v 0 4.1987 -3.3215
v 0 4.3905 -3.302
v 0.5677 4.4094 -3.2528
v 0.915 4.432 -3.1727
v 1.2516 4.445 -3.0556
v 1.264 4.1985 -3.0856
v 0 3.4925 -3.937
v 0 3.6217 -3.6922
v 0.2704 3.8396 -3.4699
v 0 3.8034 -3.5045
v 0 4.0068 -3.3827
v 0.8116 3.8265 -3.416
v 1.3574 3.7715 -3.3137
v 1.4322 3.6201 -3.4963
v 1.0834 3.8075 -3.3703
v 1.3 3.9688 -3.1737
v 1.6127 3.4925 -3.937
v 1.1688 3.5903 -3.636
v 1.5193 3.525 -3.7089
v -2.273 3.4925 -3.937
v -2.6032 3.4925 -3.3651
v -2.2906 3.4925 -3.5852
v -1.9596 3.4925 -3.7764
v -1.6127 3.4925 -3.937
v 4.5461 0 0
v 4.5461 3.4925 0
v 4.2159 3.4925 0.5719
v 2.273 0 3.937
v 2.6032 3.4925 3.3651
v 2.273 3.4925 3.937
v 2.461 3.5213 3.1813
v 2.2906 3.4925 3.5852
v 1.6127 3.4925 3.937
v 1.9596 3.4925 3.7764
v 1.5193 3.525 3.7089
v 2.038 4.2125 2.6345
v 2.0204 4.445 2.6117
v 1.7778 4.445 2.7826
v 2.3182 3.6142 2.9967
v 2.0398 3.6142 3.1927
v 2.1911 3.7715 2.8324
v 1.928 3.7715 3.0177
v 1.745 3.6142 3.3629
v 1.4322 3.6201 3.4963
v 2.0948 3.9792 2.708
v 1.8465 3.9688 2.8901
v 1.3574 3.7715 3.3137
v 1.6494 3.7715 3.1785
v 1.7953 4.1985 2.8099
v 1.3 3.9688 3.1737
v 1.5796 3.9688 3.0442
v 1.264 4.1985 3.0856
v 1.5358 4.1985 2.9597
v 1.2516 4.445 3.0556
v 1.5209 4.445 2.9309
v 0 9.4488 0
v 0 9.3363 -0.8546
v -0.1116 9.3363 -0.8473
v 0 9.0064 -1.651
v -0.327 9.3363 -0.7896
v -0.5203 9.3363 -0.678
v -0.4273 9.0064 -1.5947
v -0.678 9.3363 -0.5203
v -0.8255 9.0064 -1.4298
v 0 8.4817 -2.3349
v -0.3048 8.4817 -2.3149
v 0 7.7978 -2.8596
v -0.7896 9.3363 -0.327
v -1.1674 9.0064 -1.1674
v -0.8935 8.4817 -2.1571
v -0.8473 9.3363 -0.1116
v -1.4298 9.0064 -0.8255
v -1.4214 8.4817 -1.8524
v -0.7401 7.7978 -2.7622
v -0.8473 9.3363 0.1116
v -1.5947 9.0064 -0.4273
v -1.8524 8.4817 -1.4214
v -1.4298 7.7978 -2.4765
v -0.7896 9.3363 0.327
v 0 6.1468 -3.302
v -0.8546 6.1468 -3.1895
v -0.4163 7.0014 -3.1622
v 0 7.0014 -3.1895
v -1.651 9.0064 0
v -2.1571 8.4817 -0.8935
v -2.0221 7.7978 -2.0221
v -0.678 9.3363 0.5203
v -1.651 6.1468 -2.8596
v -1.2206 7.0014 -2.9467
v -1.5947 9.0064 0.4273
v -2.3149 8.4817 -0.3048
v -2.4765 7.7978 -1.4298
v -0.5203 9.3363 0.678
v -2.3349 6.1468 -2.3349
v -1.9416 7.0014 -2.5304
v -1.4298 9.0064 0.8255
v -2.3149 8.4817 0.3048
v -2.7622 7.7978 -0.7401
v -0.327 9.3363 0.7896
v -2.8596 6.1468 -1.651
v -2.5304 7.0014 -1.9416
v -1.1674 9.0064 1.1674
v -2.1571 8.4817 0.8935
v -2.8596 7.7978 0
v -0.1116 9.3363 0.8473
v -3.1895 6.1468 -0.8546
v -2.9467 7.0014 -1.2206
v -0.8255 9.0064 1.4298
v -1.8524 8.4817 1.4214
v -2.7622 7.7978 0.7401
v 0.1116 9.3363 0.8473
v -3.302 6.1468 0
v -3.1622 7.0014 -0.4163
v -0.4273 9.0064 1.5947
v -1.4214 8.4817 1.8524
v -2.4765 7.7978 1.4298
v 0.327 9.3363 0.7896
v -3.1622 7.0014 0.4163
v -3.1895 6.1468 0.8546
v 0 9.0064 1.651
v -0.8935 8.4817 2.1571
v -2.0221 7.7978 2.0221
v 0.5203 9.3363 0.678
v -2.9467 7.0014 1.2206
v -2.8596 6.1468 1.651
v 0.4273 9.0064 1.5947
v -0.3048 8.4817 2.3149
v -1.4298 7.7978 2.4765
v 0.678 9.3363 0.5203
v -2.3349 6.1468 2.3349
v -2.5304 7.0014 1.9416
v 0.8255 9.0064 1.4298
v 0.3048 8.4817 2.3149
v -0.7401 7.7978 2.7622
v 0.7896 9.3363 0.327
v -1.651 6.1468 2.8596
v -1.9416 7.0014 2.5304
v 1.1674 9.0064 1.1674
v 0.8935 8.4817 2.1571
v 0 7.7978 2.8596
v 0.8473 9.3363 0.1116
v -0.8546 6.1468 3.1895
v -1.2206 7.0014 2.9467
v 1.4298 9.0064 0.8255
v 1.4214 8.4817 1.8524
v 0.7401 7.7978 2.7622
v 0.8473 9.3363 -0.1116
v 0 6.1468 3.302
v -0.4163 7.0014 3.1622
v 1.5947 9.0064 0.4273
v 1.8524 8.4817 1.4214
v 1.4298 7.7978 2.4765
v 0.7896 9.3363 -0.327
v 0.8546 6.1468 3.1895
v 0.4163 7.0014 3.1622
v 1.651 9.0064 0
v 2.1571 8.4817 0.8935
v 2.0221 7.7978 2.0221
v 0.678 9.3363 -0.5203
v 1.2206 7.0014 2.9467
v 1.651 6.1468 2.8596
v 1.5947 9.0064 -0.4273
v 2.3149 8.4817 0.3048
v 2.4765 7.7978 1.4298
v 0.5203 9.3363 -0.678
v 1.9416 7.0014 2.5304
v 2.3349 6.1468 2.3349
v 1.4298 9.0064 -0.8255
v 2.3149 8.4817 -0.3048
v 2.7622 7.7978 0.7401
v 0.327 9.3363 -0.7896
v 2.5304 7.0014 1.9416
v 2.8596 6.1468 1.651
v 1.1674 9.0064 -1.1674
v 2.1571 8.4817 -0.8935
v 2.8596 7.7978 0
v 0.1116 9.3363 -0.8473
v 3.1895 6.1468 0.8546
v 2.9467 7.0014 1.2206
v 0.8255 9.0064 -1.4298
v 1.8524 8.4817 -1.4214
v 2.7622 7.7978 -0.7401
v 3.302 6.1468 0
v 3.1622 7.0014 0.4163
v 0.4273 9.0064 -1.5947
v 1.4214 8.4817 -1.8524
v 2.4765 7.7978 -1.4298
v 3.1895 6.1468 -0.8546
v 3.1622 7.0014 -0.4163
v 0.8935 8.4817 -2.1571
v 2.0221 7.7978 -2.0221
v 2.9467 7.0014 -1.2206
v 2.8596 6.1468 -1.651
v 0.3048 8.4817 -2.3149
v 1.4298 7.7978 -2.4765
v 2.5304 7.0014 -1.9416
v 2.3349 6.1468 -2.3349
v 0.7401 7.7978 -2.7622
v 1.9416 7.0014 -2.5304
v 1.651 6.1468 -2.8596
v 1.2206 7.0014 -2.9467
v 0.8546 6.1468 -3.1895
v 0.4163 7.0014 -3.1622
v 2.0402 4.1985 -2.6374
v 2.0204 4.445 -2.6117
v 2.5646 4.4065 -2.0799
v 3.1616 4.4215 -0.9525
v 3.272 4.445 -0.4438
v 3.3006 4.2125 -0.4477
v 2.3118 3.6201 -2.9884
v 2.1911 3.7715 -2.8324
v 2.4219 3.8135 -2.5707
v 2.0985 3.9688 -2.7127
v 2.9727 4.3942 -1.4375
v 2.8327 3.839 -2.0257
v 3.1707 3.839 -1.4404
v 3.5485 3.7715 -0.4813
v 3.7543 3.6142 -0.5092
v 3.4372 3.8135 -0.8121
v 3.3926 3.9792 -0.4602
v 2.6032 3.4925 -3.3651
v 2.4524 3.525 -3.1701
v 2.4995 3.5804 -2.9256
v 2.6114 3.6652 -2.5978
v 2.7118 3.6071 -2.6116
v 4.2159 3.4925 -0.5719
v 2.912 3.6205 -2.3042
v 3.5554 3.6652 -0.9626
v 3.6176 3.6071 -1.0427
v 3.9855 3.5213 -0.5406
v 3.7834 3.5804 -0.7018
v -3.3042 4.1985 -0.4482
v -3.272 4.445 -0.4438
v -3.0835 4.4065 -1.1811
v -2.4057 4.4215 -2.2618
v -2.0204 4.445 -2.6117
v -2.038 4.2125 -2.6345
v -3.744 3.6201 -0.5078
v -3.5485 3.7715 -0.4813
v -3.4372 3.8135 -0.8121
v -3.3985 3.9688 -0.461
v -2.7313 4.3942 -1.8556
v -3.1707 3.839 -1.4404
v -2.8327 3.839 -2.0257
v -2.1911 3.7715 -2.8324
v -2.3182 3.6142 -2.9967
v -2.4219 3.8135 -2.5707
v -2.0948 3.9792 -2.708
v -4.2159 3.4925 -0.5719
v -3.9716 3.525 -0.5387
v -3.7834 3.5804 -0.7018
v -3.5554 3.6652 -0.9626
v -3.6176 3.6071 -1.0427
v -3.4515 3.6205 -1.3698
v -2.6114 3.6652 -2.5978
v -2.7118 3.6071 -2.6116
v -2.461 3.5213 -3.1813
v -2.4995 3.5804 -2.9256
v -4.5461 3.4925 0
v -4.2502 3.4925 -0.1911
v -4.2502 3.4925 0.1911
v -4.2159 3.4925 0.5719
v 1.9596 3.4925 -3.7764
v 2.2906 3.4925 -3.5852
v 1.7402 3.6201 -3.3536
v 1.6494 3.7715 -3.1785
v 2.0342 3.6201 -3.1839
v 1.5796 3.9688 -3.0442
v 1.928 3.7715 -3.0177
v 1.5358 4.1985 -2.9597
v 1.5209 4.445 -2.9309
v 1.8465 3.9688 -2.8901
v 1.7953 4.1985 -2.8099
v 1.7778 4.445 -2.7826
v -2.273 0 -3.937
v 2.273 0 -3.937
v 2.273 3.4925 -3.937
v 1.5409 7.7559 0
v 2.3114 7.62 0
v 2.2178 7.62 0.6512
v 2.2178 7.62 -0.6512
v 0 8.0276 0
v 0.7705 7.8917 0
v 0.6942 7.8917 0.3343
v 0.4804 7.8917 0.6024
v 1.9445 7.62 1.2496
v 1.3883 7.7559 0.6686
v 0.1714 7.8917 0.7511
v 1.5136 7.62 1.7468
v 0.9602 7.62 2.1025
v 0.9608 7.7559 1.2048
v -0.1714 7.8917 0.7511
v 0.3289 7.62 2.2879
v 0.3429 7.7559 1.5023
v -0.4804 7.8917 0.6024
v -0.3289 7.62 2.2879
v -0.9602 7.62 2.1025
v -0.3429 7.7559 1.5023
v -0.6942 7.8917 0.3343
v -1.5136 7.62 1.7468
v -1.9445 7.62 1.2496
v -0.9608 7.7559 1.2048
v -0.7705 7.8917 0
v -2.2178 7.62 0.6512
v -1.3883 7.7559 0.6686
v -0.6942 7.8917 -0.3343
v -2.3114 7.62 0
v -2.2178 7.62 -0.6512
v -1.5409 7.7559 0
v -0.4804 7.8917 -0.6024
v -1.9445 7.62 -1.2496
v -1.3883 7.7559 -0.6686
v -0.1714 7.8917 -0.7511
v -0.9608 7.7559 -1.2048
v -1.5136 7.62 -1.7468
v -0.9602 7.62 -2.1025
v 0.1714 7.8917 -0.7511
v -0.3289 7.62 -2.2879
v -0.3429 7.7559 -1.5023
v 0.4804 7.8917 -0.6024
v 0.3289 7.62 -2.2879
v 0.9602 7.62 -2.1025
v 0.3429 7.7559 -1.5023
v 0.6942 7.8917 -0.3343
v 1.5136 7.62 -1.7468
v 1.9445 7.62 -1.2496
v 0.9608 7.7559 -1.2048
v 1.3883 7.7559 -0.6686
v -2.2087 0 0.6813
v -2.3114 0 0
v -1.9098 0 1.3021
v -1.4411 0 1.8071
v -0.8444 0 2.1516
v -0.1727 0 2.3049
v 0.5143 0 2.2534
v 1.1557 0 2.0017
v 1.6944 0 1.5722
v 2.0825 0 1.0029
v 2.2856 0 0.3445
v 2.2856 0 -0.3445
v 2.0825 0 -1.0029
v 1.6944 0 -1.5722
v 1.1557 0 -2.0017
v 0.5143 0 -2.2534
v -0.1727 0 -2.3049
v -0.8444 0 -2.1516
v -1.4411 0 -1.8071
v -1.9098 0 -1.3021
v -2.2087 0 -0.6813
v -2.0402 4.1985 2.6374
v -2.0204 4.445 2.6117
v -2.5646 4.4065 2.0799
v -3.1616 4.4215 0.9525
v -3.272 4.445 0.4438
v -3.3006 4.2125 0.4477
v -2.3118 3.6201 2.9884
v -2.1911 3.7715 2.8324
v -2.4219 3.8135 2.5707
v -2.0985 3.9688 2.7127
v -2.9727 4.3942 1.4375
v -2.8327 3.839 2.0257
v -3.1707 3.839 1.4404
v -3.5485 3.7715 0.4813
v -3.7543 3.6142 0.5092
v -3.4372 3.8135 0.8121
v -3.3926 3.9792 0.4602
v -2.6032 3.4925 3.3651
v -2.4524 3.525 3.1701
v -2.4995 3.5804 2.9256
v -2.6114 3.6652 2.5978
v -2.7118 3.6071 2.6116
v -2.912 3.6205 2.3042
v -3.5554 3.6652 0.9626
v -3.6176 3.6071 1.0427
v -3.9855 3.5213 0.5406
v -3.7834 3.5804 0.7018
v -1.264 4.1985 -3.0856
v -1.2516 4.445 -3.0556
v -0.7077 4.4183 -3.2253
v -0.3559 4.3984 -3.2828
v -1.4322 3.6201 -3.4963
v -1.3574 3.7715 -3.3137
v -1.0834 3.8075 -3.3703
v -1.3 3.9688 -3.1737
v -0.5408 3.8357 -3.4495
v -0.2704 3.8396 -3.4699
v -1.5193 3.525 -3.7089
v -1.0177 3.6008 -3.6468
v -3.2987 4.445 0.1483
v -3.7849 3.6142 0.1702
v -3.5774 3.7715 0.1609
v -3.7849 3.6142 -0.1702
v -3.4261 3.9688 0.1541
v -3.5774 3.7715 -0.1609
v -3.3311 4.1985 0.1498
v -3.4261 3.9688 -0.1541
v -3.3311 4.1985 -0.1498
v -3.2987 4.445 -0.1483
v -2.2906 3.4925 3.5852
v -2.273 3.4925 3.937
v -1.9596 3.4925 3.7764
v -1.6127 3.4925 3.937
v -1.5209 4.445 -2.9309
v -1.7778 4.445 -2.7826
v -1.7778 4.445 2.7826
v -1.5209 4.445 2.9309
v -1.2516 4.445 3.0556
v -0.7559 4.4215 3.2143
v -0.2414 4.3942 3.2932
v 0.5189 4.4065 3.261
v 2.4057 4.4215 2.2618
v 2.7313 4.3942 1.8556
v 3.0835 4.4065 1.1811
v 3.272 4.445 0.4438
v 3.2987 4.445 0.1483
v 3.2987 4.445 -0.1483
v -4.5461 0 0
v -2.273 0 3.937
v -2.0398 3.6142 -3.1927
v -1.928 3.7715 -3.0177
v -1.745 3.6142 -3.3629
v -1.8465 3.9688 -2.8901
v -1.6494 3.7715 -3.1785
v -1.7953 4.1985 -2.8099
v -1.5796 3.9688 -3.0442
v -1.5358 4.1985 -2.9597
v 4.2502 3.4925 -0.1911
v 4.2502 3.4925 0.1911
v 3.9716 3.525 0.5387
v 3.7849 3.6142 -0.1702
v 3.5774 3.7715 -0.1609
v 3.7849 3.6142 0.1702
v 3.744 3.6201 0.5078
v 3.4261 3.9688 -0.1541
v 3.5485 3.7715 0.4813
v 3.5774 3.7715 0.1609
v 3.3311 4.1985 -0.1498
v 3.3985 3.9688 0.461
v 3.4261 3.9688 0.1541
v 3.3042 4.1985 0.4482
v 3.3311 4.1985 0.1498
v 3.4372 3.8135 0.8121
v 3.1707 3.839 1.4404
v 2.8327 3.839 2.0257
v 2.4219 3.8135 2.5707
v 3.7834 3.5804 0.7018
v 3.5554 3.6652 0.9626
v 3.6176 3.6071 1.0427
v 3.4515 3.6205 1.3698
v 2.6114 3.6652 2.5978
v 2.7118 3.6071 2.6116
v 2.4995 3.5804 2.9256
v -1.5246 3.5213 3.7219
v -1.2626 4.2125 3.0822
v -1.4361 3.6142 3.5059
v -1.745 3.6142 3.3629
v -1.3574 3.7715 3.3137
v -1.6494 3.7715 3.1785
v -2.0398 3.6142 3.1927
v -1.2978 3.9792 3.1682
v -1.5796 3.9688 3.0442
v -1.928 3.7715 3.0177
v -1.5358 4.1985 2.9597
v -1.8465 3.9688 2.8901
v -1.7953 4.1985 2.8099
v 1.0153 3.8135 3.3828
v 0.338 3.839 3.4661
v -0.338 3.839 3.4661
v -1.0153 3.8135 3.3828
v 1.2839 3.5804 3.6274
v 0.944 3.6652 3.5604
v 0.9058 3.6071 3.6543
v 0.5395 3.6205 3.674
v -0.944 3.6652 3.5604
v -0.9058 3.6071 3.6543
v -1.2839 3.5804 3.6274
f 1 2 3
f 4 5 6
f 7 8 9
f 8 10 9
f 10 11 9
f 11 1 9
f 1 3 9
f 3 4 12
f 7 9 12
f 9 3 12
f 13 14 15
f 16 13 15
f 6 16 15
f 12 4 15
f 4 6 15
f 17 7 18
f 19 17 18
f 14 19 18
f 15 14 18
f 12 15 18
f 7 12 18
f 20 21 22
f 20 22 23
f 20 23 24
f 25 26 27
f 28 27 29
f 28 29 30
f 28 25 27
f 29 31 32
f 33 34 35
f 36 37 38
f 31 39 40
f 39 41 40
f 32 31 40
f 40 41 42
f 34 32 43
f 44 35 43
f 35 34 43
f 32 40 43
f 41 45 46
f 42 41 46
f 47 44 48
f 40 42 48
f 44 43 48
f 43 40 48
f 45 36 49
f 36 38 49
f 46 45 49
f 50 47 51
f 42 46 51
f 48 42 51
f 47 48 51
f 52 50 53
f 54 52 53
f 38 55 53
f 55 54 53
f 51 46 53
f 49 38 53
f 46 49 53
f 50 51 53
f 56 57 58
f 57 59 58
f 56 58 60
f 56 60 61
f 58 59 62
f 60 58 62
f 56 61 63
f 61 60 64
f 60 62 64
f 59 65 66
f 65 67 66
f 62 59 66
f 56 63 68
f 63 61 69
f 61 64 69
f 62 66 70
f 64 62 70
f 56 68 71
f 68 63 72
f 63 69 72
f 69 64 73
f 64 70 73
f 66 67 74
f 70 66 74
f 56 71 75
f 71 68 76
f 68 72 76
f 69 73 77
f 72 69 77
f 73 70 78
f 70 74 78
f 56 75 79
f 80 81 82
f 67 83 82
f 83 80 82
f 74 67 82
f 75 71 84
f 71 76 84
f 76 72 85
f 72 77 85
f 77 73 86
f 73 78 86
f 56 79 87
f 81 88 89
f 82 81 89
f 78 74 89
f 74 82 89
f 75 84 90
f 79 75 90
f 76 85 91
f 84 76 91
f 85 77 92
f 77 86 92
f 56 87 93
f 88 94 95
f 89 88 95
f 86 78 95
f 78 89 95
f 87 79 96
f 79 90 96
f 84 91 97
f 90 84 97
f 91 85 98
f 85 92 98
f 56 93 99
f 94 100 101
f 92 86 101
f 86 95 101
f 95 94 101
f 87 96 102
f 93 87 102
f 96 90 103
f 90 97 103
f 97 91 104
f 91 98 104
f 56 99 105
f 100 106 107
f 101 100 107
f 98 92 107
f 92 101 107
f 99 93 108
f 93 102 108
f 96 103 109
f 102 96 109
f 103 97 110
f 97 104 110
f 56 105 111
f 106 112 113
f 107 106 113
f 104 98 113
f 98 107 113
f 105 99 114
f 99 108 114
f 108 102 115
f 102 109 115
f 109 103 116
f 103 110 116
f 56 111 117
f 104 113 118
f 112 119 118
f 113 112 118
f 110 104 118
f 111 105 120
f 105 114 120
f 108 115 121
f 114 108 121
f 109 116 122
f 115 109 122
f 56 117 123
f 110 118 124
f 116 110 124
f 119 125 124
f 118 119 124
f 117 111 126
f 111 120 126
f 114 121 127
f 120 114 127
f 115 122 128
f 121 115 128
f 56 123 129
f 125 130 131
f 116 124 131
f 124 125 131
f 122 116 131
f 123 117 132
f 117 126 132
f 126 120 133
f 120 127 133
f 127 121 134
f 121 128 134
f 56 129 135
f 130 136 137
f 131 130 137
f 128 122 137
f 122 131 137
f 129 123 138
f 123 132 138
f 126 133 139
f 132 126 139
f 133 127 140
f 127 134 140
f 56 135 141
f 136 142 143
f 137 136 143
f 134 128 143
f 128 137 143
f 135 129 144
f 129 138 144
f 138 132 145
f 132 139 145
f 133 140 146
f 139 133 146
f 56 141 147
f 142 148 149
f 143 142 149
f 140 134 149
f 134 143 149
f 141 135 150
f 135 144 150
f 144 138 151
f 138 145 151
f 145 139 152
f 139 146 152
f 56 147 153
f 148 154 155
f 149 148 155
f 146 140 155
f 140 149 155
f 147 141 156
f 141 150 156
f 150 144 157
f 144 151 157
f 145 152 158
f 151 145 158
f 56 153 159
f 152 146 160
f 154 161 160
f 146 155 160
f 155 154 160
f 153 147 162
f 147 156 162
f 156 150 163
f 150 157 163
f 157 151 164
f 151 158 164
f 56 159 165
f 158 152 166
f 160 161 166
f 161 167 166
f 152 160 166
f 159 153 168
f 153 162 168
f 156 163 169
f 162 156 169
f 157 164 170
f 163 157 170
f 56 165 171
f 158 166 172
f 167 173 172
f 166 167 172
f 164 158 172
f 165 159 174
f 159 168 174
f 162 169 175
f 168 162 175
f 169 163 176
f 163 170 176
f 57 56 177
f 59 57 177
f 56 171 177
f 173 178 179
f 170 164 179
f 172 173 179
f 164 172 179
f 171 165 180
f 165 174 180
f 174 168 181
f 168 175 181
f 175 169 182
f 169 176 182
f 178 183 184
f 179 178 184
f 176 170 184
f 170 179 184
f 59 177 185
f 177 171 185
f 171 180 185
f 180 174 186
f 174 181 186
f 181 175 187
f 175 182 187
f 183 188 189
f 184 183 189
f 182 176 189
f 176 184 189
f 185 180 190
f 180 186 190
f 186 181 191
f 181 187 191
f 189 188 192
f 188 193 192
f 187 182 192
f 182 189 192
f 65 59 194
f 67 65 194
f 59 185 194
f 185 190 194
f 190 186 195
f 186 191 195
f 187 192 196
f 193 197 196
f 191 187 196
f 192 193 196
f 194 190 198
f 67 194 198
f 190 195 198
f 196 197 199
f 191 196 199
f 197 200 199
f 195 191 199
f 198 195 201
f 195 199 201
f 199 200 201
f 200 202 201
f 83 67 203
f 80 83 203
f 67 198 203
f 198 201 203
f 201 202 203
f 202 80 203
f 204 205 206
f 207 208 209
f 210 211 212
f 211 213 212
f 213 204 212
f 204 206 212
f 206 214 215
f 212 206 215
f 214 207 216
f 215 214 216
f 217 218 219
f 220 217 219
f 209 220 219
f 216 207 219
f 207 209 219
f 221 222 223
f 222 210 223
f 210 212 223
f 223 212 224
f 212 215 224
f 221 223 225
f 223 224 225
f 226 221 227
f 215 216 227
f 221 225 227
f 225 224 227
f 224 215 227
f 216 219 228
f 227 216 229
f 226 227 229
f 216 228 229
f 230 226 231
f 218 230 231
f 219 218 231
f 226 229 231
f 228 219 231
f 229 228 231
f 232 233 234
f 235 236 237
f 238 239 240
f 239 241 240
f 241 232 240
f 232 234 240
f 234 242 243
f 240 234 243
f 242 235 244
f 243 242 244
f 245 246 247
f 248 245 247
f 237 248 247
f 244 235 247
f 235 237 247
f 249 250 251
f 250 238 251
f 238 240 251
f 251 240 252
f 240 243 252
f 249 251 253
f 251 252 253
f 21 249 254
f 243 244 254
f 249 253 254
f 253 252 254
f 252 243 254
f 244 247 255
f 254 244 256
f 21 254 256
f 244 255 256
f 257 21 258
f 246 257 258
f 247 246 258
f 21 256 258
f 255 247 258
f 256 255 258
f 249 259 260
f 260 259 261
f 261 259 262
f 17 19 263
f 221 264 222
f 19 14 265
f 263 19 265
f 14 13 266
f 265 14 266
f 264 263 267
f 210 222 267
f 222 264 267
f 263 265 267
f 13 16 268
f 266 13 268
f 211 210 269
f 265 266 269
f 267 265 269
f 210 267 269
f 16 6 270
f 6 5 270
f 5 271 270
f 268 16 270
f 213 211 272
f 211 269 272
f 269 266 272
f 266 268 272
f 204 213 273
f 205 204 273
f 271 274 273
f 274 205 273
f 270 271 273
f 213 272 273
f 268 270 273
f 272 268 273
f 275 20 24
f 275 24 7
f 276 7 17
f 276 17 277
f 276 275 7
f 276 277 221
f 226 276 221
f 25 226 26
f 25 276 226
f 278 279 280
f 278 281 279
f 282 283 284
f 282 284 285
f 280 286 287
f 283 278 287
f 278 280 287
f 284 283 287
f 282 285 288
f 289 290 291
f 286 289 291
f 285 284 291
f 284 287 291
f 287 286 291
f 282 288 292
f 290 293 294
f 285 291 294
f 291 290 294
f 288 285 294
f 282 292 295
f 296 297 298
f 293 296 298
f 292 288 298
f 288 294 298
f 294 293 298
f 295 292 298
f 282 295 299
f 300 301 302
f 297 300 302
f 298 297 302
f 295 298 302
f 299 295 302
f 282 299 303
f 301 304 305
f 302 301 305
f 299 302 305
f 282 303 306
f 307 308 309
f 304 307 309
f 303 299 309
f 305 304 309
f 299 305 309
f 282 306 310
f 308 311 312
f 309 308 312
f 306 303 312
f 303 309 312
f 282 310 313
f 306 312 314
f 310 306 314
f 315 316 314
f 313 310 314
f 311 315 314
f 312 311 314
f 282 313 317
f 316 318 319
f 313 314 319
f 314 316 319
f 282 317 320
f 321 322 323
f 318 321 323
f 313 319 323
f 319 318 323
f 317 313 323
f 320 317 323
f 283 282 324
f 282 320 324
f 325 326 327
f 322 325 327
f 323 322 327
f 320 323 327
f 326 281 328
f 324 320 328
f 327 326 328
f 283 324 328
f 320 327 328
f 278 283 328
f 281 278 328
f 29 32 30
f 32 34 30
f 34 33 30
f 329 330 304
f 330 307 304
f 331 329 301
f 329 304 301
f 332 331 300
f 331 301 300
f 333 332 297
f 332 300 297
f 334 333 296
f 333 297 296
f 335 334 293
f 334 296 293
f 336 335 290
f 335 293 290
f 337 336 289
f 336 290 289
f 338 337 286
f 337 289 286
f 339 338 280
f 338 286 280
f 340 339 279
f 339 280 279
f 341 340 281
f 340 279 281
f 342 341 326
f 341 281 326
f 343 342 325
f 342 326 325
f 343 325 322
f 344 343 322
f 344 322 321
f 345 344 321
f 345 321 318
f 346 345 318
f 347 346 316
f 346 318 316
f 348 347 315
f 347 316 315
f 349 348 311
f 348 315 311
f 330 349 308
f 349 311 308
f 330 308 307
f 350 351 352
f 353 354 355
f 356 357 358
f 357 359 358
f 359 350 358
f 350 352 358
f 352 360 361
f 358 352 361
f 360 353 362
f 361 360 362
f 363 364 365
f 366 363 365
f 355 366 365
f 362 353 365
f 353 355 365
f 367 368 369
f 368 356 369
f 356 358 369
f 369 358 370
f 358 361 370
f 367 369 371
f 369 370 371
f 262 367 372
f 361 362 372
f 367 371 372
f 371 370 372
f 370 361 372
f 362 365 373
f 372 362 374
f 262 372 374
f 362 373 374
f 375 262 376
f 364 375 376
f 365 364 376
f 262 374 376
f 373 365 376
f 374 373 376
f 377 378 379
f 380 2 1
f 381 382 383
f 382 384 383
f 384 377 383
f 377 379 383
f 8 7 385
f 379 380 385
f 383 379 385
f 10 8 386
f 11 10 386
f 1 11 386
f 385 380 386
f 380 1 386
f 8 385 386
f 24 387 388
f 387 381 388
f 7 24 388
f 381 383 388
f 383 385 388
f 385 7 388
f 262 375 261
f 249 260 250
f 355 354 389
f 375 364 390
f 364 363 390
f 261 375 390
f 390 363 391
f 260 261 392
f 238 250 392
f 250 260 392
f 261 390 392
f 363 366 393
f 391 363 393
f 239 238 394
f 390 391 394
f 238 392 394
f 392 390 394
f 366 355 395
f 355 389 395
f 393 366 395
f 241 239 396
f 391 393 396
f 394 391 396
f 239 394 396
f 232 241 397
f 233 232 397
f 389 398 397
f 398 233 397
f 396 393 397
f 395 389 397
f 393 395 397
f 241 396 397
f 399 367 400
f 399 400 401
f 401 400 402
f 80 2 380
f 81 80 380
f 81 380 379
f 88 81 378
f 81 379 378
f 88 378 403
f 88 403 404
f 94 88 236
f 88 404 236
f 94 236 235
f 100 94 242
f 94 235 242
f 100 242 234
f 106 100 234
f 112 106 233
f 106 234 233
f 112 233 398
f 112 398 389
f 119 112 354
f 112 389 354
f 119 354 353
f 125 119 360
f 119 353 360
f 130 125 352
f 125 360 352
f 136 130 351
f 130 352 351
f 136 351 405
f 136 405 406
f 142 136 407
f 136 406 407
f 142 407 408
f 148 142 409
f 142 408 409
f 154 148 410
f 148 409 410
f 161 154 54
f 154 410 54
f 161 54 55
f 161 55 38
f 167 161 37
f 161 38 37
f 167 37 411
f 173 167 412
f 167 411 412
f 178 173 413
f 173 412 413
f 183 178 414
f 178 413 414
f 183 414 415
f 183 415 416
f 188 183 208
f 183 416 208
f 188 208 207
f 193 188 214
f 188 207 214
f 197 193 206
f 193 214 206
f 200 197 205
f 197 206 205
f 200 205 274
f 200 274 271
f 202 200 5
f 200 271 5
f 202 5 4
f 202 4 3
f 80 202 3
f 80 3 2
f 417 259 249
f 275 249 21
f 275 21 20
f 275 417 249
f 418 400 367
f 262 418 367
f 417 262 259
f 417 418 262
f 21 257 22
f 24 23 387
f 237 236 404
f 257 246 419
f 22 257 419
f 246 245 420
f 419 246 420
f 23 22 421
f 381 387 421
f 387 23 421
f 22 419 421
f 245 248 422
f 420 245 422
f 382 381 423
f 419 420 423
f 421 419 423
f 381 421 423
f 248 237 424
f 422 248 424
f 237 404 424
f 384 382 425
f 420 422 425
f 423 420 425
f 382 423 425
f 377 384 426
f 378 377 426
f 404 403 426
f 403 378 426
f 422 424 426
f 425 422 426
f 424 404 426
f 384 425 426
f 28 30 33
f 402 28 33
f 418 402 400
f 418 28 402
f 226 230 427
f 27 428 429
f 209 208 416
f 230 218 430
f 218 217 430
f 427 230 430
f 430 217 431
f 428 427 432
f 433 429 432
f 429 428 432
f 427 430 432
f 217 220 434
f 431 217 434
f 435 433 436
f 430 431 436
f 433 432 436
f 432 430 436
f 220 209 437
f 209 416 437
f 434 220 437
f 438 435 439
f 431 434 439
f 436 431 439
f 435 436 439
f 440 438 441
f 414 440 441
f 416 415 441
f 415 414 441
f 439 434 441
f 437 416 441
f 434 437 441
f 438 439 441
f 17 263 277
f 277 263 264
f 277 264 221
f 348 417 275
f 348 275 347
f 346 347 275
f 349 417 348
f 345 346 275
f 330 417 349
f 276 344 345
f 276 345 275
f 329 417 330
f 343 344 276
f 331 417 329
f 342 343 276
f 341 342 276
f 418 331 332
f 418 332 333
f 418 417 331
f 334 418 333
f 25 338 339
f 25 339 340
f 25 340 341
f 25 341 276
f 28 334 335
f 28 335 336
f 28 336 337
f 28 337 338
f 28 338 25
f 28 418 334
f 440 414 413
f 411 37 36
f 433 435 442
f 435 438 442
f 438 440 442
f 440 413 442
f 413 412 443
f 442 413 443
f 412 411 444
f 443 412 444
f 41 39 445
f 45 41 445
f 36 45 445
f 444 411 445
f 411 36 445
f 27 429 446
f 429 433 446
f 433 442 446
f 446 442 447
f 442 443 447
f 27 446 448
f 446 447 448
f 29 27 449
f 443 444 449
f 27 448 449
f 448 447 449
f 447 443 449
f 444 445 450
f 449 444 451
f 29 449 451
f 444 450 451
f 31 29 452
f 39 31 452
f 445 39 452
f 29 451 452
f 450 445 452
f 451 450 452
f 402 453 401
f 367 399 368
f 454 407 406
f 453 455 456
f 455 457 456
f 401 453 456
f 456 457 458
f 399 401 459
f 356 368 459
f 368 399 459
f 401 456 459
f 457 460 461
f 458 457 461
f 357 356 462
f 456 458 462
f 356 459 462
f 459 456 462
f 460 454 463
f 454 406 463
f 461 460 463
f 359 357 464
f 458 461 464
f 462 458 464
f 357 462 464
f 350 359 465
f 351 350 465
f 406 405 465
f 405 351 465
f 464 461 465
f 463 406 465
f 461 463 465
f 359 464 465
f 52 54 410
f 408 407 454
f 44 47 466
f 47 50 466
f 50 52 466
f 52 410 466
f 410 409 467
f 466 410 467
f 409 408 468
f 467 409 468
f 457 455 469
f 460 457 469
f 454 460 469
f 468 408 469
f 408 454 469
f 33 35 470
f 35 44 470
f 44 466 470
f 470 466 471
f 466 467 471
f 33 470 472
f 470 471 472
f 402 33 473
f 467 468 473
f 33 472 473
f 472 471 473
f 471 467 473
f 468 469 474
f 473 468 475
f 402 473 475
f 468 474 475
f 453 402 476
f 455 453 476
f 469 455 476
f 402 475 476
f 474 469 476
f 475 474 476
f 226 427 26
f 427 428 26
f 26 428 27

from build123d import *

# Parameters (mm, degrees)
BOSS_EXTRUDE1_DEPTH        = 3.4925
F_12_28_TAPPED_HOLE1_D     = 4.6228
F_12_28_TAPPED_HOLE1_DEPTH = 7.62
F_12_28_TAPPED_HOLE1_TIP   = 0.407562183
FILLET2_R                  = 0.9525


with BuildPart() as part:
    # Sketch1 → Revolve2 (revolve)
    with BuildSketch(Plane.XY, mode=Mode.PRIVATE) as revolve2_sk:
        with BuildLine():
            Line((0, 0), (0, 9.4488))
            ThreePointArc((0, 9.4488), (-2.334866591, 8.481666591), (-3.302, 6.1468))
            Line((-3.302, 6.1468), (-3.302, 0))
            Line((-3.302, 0), (0, 0))
        make_face()
    revolve(revolve2_sk.sketch.rotate(Axis((0, 0, 0), (0, 1, 0)), 270), axis=Axis((0, 0, 0), (0, 1, 0)))

    # Sketch2 → Boss-Extrude1 (add)
    with BuildSketch(Plane.XZ):
        Polygon((4.54605602, 0), (2.27302801, 3.937), (-2.27302801, 3.937), (-4.54605602, 0), (-2.27302801, -3.937), (2.27302801, -3.937), align=None)
    extrude(amount=-BOSS_EXTRUDE1_DEPTH)

    # #12-28 Tapped Hole1
    with Locations(Plane.XZ):
        with Locations((0, 0)):
            Hole(F_12_28_TAPPED_HOLE1_D / 2, depth=F_12_28_TAPPED_HOLE1_DEPTH)
            with Locations((0, 0, -(F_12_28_TAPPED_HOLE1_DEPTH + F_12_28_TAPPED_HOLE1_TIP / 2))):  # 160° drill point
                Cone(0, F_12_28_TAPPED_HOLE1_D / 2, F_12_28_TAPPED_HOLE1_TIP, mode=Mode.SUBTRACT)

    # Fillet2
    fillet2_edges = [part.edges().sort_by_distance(p)[0] for p in [
        (0, 3.4925, 3.302),
    ]]
    fillet(fillet2_edges, radius=FILLET2_R)


solid = part.part
